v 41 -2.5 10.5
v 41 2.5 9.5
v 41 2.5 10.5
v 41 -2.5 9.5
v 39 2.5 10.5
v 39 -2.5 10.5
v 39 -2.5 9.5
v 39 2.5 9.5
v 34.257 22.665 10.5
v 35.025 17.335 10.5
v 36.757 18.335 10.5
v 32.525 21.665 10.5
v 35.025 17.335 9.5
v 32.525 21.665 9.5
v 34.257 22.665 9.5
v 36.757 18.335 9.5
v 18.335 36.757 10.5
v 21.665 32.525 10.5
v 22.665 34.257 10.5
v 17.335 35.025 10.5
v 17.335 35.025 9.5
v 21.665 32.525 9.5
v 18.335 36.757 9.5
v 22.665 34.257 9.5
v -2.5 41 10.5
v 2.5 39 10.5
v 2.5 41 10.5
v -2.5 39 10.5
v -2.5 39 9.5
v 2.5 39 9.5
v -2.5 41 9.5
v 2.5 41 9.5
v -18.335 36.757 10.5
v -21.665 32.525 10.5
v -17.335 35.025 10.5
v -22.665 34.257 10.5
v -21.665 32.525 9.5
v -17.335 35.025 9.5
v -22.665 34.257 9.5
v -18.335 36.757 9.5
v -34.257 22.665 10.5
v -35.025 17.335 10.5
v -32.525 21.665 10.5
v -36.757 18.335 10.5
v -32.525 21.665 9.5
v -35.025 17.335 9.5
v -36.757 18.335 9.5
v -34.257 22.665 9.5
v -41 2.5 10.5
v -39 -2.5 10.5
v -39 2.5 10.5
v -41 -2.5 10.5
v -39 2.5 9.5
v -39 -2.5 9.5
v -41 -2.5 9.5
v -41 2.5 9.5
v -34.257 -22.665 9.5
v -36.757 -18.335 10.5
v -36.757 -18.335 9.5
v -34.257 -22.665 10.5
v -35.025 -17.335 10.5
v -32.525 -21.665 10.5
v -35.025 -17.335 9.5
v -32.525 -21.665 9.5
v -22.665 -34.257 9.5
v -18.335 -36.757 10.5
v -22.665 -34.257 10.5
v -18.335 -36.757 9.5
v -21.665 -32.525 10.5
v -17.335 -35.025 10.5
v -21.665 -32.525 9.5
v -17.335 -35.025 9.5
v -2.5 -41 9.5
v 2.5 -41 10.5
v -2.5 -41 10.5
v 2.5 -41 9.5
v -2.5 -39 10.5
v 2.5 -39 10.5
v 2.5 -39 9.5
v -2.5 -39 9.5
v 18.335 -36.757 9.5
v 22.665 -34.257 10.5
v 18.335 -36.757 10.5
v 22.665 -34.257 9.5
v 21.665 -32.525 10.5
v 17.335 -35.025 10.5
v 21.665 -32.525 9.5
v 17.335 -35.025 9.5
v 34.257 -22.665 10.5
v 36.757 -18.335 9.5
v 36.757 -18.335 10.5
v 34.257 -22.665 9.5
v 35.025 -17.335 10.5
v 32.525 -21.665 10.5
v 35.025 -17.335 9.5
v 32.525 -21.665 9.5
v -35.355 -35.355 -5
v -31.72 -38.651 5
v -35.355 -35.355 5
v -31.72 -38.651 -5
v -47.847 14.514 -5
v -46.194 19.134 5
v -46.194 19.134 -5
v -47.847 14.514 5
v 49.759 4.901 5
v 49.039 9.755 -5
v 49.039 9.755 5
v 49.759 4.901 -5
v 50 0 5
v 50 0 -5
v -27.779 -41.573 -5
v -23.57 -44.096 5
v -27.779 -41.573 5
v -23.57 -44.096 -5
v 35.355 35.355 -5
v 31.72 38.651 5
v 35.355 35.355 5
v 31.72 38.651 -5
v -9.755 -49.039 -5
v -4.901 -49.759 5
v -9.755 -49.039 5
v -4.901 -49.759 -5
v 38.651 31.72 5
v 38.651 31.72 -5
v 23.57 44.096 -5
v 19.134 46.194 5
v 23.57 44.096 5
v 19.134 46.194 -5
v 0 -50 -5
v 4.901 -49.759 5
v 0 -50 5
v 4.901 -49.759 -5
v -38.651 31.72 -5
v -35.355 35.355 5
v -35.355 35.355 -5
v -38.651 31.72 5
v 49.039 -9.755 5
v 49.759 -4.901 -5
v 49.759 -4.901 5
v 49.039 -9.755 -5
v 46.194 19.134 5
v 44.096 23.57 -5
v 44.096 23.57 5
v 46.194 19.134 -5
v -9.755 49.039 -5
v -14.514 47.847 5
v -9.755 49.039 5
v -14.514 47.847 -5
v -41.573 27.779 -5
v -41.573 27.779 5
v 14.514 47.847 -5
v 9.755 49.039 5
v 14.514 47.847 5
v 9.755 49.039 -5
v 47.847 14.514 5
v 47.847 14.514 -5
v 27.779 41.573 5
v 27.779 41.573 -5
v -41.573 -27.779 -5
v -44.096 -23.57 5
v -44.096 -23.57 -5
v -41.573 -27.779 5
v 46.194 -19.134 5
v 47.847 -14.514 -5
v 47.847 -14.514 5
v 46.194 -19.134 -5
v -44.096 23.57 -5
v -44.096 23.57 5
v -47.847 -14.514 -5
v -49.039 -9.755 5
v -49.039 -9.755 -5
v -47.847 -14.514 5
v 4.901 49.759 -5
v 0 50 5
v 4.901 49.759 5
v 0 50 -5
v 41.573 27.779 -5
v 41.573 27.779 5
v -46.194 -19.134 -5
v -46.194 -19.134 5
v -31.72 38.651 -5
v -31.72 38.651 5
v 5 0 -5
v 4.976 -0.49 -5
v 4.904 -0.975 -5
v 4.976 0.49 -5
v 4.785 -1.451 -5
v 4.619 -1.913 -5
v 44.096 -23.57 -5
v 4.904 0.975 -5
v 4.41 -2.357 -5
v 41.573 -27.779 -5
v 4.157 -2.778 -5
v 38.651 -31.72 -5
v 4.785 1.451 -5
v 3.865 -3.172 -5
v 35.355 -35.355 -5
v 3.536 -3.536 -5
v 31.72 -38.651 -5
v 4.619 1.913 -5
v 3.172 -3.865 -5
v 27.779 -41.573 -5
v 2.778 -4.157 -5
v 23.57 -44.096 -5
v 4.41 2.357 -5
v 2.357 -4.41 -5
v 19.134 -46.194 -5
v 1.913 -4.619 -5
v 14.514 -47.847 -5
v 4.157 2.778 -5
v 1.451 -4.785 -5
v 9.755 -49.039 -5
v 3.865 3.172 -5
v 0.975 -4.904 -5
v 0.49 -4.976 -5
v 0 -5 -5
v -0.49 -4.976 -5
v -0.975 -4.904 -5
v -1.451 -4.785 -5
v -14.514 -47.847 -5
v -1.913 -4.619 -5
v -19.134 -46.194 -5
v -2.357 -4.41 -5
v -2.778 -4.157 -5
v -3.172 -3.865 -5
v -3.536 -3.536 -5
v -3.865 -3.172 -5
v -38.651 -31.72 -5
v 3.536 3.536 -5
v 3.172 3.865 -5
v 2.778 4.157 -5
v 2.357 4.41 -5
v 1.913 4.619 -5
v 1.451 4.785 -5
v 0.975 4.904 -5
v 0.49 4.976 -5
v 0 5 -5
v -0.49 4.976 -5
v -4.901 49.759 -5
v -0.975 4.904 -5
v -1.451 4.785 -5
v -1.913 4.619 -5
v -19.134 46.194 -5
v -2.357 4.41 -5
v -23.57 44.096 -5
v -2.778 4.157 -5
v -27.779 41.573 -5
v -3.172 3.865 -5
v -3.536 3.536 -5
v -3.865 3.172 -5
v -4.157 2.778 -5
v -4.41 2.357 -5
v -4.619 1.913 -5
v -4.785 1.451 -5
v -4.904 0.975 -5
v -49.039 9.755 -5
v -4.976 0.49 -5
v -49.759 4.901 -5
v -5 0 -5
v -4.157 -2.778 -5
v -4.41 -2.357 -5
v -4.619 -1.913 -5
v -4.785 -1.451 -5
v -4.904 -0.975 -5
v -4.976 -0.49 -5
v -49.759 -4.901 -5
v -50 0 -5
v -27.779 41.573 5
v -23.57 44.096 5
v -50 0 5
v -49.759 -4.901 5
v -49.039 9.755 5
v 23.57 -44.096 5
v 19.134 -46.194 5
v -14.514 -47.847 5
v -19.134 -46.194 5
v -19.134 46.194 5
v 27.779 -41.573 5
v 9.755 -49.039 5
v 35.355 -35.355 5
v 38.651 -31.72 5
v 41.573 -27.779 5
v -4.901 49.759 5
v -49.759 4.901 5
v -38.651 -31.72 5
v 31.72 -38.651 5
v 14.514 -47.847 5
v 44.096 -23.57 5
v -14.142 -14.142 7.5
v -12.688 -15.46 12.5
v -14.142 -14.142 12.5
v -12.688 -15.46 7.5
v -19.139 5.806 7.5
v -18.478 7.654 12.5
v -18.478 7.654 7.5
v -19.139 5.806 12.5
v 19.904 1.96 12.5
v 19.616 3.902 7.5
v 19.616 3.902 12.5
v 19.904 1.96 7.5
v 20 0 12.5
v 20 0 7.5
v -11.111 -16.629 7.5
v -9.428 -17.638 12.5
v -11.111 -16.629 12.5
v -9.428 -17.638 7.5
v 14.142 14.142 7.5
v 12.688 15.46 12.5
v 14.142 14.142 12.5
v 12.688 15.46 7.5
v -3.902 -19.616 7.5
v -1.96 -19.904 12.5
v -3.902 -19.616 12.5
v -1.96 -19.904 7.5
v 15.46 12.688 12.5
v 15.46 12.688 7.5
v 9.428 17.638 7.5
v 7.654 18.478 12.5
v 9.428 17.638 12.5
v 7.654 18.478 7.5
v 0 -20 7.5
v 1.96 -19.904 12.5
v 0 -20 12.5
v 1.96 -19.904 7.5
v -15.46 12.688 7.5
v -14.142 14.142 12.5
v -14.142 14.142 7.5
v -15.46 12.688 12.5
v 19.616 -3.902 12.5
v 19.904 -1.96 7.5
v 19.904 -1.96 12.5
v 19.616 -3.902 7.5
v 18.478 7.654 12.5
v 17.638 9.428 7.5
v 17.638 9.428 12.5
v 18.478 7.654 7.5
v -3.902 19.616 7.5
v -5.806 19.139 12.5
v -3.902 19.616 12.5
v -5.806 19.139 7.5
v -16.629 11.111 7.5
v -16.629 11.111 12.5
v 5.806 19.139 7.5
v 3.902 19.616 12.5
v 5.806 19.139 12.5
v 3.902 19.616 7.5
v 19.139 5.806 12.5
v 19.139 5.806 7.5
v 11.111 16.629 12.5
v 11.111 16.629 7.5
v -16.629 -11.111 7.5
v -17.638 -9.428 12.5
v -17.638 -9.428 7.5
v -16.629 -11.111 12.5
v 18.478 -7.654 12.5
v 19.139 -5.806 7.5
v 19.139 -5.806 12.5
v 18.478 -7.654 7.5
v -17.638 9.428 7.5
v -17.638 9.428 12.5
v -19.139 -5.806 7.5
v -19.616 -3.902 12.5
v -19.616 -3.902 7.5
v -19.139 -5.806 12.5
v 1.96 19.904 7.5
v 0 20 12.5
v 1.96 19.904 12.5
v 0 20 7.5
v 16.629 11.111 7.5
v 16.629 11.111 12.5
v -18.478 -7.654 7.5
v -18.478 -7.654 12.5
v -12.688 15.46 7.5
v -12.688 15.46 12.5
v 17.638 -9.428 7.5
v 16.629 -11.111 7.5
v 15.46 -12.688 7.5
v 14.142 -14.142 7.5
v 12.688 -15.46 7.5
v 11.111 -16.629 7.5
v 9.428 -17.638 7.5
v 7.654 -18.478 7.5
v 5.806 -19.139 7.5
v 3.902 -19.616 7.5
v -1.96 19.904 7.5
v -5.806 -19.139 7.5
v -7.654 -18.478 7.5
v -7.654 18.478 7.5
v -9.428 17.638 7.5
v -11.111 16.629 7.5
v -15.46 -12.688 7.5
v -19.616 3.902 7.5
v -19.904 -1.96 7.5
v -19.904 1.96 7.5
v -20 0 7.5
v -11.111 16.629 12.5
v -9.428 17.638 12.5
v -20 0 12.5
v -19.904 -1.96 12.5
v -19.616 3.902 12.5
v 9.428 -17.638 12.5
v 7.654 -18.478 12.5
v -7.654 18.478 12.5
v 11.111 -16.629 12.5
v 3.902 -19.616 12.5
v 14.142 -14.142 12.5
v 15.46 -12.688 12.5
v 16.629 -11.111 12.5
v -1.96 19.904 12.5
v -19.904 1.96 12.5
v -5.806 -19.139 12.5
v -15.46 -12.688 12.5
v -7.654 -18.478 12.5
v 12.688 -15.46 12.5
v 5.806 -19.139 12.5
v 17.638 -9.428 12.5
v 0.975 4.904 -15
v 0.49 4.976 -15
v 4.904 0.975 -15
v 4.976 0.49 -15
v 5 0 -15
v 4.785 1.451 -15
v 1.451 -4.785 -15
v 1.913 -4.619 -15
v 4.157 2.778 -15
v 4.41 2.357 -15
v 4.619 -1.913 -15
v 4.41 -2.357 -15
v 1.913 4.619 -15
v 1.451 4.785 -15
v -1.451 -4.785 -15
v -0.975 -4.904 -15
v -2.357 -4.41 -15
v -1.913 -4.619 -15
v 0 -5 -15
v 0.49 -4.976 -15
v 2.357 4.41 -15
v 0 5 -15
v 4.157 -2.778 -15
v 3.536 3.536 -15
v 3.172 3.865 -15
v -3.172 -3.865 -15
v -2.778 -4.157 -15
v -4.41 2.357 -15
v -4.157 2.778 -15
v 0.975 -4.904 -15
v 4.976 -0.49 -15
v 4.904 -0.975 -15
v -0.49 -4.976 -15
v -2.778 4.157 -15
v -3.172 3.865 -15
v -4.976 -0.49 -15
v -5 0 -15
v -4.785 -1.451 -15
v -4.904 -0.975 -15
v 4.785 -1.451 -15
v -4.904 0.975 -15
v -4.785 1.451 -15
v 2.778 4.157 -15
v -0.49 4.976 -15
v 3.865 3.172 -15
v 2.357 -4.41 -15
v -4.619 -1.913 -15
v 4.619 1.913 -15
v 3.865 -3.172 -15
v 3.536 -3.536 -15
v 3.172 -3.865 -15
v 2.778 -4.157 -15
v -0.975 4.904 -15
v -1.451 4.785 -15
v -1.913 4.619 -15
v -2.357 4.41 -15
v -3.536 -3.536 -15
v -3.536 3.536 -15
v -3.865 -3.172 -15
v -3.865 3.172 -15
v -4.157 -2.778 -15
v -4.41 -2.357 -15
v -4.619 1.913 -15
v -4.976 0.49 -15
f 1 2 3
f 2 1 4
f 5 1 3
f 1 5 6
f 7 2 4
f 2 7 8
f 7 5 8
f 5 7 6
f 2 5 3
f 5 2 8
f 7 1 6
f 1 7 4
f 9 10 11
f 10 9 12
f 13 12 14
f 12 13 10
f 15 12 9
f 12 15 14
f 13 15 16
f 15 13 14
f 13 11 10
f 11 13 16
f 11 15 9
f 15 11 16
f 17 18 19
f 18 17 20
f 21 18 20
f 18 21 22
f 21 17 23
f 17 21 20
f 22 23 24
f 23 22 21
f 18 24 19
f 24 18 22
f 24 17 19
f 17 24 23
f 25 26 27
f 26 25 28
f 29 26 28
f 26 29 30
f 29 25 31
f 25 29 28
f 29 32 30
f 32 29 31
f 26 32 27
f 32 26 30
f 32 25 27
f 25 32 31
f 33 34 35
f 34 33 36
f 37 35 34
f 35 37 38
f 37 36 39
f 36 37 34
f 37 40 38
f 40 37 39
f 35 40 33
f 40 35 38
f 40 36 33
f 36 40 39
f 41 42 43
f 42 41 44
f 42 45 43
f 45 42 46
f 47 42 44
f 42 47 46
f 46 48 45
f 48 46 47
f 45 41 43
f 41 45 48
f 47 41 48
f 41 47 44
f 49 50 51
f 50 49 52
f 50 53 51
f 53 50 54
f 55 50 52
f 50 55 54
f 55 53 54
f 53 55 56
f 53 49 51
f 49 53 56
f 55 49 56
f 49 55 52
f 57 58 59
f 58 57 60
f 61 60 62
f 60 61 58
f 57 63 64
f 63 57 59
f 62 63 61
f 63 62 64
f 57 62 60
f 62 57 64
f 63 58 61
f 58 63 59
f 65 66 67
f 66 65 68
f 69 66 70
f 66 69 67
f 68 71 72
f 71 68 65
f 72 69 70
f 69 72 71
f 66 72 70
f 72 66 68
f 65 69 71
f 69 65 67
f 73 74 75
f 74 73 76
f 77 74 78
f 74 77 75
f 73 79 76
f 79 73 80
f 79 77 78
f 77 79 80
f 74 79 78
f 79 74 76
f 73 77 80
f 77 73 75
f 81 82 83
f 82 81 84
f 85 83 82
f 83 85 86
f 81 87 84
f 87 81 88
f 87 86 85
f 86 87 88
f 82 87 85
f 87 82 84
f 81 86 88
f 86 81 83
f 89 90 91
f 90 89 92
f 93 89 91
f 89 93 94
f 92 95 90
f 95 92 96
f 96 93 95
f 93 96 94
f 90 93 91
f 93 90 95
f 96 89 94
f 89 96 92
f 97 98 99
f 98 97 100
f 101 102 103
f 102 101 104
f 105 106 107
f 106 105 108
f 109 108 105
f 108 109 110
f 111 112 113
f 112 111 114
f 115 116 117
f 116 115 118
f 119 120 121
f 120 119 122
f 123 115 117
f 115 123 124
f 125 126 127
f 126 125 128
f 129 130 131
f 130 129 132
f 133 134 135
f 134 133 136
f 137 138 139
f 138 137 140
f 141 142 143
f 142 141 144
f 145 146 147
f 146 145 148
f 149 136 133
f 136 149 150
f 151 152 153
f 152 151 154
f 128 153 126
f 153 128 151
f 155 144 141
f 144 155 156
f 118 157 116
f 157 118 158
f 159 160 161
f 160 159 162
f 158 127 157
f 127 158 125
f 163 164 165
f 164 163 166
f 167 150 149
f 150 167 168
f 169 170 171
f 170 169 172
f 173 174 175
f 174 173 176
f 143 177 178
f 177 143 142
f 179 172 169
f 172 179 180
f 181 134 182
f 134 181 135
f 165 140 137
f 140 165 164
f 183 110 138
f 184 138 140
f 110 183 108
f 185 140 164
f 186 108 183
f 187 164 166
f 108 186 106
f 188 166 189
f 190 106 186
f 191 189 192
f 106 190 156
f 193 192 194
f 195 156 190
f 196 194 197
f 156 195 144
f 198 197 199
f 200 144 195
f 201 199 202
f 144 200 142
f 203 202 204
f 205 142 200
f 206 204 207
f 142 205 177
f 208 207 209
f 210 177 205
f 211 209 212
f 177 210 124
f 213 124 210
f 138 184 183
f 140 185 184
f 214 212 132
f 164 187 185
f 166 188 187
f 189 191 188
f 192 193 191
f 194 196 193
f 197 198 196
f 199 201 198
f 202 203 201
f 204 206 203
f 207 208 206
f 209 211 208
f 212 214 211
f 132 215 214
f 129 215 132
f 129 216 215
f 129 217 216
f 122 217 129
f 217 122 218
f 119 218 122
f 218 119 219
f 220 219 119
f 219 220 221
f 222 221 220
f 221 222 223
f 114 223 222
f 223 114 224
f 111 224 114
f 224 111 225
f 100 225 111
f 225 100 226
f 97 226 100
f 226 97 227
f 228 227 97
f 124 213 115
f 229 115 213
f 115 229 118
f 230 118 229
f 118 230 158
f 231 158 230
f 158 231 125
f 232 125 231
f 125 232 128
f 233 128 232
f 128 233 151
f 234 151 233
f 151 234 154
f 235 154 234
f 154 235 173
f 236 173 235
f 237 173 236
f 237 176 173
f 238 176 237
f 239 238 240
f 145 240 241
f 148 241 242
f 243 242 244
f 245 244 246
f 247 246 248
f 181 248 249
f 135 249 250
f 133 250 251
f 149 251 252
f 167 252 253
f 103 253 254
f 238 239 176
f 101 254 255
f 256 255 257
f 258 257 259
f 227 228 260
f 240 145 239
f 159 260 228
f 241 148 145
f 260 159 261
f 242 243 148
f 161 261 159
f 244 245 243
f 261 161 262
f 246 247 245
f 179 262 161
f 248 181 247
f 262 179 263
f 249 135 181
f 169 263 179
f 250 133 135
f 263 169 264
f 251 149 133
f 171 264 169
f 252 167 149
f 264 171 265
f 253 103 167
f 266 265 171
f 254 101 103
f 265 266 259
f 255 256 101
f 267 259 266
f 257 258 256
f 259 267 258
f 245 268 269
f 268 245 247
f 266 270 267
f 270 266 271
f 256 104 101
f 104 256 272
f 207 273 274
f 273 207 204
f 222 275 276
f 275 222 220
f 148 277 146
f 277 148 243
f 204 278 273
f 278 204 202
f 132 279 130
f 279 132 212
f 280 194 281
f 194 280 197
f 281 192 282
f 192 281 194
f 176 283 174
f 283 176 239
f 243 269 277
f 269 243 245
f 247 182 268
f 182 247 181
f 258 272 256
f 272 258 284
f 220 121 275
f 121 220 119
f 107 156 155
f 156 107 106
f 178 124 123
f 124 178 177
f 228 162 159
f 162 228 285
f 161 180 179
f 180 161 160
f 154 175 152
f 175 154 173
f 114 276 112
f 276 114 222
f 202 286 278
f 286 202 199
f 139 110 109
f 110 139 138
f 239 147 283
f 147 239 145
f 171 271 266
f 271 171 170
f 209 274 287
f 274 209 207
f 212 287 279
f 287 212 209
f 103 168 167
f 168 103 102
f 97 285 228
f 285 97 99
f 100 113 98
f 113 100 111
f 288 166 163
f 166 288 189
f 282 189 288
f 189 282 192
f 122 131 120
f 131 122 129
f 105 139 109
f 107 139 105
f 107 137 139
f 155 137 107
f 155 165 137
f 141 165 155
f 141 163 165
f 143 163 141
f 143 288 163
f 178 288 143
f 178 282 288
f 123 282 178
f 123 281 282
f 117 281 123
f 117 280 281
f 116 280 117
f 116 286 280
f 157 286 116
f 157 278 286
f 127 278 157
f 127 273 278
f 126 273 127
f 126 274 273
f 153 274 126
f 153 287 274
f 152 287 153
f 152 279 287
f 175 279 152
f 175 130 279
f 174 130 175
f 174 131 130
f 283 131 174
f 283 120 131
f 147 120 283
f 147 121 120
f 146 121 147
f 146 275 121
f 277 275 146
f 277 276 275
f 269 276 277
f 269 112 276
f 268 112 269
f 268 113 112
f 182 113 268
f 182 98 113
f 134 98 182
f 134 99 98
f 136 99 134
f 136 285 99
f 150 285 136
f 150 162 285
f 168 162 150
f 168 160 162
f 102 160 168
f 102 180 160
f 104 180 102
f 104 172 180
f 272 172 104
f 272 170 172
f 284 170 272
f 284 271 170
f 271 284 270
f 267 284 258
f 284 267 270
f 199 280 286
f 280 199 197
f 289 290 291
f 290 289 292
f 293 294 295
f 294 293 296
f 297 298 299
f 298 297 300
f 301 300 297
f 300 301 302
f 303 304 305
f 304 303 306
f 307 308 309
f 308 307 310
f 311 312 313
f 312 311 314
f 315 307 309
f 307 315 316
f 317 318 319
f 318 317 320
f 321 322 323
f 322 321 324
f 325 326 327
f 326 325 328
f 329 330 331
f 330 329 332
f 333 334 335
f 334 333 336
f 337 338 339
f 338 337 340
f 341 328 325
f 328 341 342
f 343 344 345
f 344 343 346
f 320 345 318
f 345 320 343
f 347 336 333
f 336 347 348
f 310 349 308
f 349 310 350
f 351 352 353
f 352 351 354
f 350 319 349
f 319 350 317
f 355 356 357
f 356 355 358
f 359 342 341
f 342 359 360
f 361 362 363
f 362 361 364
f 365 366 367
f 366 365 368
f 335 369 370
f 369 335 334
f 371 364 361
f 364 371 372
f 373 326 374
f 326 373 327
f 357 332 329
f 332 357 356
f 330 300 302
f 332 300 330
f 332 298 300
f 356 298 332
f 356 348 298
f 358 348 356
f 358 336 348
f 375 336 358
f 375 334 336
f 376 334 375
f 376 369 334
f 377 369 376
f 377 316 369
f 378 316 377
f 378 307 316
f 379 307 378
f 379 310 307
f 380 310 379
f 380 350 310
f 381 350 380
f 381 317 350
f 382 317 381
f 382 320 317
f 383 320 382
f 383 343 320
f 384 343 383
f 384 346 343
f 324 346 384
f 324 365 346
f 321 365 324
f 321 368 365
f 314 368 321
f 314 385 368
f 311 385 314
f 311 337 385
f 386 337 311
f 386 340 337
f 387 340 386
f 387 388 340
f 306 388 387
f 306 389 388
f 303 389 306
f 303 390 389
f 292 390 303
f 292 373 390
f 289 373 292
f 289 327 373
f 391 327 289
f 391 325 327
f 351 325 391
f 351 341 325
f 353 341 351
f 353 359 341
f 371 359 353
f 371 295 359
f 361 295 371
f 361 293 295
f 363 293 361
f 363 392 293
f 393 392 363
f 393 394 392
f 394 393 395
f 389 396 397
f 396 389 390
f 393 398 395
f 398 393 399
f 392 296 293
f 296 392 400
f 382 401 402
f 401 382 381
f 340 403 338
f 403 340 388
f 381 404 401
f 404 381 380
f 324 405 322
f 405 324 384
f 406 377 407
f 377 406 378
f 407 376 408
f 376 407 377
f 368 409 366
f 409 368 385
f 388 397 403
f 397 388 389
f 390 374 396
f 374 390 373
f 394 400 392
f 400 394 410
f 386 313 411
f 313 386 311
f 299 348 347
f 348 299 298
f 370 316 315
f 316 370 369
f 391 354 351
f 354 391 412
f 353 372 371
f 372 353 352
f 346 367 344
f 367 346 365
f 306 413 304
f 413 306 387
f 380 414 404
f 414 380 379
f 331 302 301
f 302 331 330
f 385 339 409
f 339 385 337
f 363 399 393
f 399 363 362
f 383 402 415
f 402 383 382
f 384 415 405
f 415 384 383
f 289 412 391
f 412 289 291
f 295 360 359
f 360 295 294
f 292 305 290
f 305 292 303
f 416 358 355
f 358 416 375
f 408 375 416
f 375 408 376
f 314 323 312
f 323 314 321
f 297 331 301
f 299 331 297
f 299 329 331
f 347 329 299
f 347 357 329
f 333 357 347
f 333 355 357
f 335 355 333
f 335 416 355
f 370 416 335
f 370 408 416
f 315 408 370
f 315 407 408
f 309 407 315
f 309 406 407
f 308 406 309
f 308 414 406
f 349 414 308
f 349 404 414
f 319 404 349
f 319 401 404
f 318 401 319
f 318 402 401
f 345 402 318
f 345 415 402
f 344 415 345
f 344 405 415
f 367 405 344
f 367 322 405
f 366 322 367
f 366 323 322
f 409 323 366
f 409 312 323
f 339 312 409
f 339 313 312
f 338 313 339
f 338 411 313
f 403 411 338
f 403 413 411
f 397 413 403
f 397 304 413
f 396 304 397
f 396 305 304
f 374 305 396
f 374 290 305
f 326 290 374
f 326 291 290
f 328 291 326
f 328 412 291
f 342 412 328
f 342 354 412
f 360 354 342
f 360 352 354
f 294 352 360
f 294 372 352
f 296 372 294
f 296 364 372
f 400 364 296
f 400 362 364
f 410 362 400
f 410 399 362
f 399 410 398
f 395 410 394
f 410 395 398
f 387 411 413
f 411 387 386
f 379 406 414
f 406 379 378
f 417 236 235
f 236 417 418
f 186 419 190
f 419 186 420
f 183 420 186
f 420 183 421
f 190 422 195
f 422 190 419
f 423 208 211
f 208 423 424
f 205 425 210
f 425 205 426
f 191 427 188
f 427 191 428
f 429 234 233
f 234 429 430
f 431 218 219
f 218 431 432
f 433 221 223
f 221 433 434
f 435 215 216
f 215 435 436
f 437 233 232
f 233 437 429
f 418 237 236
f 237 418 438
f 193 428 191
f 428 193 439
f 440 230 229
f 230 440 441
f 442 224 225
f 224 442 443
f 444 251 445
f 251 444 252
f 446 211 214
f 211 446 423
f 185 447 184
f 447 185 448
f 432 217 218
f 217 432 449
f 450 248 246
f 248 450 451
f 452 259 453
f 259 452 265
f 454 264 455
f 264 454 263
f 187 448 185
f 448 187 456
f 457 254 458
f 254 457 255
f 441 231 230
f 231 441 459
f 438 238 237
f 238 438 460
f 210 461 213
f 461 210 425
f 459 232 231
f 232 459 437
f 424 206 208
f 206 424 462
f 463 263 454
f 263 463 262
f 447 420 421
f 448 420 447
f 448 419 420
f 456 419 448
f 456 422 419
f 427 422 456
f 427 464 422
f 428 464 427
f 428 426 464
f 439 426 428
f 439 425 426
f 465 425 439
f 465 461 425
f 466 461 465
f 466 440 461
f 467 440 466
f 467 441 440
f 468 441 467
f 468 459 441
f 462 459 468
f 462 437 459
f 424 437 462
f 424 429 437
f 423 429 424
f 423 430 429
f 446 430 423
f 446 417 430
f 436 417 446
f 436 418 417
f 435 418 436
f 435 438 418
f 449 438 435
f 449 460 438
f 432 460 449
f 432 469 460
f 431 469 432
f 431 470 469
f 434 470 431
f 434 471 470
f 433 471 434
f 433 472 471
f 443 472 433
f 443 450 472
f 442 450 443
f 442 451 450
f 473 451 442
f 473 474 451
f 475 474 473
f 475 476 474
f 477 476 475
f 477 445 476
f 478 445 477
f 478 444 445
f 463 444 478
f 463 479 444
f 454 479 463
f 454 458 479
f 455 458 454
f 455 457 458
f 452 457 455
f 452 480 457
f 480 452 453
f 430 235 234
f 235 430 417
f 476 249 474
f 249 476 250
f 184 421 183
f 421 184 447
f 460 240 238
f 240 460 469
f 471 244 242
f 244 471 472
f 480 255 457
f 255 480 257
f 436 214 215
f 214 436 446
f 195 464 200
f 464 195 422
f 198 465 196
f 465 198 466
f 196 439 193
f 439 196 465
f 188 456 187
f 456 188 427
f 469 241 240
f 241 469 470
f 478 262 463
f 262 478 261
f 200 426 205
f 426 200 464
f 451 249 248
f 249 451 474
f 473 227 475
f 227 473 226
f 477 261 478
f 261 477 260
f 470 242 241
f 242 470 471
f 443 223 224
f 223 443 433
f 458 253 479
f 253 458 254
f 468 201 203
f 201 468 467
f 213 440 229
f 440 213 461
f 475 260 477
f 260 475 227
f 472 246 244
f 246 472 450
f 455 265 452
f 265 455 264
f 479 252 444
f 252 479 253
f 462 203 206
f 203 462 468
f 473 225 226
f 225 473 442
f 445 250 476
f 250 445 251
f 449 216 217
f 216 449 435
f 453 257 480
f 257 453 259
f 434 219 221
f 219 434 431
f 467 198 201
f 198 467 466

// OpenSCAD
$fn=64;

module variac() {
    union() {
        // Base cylinder
        cylinder(h=10, r=50, center=true);
        
        // Top knob
        translate([0, 0, 10])
            cylinder(h=5, r=20, center=true);
        
        // Central shaft
        translate([0, 0, -5])
            cylinder(h=20, r=5, center=true);
        
        // Dial markings
        for (i = [0:30:330]) {
            rotate([0, 0, i])
                translate([40, 0, 10])
                    cube([2, 5, 1], center=true);
        }
    }
}

variac();
